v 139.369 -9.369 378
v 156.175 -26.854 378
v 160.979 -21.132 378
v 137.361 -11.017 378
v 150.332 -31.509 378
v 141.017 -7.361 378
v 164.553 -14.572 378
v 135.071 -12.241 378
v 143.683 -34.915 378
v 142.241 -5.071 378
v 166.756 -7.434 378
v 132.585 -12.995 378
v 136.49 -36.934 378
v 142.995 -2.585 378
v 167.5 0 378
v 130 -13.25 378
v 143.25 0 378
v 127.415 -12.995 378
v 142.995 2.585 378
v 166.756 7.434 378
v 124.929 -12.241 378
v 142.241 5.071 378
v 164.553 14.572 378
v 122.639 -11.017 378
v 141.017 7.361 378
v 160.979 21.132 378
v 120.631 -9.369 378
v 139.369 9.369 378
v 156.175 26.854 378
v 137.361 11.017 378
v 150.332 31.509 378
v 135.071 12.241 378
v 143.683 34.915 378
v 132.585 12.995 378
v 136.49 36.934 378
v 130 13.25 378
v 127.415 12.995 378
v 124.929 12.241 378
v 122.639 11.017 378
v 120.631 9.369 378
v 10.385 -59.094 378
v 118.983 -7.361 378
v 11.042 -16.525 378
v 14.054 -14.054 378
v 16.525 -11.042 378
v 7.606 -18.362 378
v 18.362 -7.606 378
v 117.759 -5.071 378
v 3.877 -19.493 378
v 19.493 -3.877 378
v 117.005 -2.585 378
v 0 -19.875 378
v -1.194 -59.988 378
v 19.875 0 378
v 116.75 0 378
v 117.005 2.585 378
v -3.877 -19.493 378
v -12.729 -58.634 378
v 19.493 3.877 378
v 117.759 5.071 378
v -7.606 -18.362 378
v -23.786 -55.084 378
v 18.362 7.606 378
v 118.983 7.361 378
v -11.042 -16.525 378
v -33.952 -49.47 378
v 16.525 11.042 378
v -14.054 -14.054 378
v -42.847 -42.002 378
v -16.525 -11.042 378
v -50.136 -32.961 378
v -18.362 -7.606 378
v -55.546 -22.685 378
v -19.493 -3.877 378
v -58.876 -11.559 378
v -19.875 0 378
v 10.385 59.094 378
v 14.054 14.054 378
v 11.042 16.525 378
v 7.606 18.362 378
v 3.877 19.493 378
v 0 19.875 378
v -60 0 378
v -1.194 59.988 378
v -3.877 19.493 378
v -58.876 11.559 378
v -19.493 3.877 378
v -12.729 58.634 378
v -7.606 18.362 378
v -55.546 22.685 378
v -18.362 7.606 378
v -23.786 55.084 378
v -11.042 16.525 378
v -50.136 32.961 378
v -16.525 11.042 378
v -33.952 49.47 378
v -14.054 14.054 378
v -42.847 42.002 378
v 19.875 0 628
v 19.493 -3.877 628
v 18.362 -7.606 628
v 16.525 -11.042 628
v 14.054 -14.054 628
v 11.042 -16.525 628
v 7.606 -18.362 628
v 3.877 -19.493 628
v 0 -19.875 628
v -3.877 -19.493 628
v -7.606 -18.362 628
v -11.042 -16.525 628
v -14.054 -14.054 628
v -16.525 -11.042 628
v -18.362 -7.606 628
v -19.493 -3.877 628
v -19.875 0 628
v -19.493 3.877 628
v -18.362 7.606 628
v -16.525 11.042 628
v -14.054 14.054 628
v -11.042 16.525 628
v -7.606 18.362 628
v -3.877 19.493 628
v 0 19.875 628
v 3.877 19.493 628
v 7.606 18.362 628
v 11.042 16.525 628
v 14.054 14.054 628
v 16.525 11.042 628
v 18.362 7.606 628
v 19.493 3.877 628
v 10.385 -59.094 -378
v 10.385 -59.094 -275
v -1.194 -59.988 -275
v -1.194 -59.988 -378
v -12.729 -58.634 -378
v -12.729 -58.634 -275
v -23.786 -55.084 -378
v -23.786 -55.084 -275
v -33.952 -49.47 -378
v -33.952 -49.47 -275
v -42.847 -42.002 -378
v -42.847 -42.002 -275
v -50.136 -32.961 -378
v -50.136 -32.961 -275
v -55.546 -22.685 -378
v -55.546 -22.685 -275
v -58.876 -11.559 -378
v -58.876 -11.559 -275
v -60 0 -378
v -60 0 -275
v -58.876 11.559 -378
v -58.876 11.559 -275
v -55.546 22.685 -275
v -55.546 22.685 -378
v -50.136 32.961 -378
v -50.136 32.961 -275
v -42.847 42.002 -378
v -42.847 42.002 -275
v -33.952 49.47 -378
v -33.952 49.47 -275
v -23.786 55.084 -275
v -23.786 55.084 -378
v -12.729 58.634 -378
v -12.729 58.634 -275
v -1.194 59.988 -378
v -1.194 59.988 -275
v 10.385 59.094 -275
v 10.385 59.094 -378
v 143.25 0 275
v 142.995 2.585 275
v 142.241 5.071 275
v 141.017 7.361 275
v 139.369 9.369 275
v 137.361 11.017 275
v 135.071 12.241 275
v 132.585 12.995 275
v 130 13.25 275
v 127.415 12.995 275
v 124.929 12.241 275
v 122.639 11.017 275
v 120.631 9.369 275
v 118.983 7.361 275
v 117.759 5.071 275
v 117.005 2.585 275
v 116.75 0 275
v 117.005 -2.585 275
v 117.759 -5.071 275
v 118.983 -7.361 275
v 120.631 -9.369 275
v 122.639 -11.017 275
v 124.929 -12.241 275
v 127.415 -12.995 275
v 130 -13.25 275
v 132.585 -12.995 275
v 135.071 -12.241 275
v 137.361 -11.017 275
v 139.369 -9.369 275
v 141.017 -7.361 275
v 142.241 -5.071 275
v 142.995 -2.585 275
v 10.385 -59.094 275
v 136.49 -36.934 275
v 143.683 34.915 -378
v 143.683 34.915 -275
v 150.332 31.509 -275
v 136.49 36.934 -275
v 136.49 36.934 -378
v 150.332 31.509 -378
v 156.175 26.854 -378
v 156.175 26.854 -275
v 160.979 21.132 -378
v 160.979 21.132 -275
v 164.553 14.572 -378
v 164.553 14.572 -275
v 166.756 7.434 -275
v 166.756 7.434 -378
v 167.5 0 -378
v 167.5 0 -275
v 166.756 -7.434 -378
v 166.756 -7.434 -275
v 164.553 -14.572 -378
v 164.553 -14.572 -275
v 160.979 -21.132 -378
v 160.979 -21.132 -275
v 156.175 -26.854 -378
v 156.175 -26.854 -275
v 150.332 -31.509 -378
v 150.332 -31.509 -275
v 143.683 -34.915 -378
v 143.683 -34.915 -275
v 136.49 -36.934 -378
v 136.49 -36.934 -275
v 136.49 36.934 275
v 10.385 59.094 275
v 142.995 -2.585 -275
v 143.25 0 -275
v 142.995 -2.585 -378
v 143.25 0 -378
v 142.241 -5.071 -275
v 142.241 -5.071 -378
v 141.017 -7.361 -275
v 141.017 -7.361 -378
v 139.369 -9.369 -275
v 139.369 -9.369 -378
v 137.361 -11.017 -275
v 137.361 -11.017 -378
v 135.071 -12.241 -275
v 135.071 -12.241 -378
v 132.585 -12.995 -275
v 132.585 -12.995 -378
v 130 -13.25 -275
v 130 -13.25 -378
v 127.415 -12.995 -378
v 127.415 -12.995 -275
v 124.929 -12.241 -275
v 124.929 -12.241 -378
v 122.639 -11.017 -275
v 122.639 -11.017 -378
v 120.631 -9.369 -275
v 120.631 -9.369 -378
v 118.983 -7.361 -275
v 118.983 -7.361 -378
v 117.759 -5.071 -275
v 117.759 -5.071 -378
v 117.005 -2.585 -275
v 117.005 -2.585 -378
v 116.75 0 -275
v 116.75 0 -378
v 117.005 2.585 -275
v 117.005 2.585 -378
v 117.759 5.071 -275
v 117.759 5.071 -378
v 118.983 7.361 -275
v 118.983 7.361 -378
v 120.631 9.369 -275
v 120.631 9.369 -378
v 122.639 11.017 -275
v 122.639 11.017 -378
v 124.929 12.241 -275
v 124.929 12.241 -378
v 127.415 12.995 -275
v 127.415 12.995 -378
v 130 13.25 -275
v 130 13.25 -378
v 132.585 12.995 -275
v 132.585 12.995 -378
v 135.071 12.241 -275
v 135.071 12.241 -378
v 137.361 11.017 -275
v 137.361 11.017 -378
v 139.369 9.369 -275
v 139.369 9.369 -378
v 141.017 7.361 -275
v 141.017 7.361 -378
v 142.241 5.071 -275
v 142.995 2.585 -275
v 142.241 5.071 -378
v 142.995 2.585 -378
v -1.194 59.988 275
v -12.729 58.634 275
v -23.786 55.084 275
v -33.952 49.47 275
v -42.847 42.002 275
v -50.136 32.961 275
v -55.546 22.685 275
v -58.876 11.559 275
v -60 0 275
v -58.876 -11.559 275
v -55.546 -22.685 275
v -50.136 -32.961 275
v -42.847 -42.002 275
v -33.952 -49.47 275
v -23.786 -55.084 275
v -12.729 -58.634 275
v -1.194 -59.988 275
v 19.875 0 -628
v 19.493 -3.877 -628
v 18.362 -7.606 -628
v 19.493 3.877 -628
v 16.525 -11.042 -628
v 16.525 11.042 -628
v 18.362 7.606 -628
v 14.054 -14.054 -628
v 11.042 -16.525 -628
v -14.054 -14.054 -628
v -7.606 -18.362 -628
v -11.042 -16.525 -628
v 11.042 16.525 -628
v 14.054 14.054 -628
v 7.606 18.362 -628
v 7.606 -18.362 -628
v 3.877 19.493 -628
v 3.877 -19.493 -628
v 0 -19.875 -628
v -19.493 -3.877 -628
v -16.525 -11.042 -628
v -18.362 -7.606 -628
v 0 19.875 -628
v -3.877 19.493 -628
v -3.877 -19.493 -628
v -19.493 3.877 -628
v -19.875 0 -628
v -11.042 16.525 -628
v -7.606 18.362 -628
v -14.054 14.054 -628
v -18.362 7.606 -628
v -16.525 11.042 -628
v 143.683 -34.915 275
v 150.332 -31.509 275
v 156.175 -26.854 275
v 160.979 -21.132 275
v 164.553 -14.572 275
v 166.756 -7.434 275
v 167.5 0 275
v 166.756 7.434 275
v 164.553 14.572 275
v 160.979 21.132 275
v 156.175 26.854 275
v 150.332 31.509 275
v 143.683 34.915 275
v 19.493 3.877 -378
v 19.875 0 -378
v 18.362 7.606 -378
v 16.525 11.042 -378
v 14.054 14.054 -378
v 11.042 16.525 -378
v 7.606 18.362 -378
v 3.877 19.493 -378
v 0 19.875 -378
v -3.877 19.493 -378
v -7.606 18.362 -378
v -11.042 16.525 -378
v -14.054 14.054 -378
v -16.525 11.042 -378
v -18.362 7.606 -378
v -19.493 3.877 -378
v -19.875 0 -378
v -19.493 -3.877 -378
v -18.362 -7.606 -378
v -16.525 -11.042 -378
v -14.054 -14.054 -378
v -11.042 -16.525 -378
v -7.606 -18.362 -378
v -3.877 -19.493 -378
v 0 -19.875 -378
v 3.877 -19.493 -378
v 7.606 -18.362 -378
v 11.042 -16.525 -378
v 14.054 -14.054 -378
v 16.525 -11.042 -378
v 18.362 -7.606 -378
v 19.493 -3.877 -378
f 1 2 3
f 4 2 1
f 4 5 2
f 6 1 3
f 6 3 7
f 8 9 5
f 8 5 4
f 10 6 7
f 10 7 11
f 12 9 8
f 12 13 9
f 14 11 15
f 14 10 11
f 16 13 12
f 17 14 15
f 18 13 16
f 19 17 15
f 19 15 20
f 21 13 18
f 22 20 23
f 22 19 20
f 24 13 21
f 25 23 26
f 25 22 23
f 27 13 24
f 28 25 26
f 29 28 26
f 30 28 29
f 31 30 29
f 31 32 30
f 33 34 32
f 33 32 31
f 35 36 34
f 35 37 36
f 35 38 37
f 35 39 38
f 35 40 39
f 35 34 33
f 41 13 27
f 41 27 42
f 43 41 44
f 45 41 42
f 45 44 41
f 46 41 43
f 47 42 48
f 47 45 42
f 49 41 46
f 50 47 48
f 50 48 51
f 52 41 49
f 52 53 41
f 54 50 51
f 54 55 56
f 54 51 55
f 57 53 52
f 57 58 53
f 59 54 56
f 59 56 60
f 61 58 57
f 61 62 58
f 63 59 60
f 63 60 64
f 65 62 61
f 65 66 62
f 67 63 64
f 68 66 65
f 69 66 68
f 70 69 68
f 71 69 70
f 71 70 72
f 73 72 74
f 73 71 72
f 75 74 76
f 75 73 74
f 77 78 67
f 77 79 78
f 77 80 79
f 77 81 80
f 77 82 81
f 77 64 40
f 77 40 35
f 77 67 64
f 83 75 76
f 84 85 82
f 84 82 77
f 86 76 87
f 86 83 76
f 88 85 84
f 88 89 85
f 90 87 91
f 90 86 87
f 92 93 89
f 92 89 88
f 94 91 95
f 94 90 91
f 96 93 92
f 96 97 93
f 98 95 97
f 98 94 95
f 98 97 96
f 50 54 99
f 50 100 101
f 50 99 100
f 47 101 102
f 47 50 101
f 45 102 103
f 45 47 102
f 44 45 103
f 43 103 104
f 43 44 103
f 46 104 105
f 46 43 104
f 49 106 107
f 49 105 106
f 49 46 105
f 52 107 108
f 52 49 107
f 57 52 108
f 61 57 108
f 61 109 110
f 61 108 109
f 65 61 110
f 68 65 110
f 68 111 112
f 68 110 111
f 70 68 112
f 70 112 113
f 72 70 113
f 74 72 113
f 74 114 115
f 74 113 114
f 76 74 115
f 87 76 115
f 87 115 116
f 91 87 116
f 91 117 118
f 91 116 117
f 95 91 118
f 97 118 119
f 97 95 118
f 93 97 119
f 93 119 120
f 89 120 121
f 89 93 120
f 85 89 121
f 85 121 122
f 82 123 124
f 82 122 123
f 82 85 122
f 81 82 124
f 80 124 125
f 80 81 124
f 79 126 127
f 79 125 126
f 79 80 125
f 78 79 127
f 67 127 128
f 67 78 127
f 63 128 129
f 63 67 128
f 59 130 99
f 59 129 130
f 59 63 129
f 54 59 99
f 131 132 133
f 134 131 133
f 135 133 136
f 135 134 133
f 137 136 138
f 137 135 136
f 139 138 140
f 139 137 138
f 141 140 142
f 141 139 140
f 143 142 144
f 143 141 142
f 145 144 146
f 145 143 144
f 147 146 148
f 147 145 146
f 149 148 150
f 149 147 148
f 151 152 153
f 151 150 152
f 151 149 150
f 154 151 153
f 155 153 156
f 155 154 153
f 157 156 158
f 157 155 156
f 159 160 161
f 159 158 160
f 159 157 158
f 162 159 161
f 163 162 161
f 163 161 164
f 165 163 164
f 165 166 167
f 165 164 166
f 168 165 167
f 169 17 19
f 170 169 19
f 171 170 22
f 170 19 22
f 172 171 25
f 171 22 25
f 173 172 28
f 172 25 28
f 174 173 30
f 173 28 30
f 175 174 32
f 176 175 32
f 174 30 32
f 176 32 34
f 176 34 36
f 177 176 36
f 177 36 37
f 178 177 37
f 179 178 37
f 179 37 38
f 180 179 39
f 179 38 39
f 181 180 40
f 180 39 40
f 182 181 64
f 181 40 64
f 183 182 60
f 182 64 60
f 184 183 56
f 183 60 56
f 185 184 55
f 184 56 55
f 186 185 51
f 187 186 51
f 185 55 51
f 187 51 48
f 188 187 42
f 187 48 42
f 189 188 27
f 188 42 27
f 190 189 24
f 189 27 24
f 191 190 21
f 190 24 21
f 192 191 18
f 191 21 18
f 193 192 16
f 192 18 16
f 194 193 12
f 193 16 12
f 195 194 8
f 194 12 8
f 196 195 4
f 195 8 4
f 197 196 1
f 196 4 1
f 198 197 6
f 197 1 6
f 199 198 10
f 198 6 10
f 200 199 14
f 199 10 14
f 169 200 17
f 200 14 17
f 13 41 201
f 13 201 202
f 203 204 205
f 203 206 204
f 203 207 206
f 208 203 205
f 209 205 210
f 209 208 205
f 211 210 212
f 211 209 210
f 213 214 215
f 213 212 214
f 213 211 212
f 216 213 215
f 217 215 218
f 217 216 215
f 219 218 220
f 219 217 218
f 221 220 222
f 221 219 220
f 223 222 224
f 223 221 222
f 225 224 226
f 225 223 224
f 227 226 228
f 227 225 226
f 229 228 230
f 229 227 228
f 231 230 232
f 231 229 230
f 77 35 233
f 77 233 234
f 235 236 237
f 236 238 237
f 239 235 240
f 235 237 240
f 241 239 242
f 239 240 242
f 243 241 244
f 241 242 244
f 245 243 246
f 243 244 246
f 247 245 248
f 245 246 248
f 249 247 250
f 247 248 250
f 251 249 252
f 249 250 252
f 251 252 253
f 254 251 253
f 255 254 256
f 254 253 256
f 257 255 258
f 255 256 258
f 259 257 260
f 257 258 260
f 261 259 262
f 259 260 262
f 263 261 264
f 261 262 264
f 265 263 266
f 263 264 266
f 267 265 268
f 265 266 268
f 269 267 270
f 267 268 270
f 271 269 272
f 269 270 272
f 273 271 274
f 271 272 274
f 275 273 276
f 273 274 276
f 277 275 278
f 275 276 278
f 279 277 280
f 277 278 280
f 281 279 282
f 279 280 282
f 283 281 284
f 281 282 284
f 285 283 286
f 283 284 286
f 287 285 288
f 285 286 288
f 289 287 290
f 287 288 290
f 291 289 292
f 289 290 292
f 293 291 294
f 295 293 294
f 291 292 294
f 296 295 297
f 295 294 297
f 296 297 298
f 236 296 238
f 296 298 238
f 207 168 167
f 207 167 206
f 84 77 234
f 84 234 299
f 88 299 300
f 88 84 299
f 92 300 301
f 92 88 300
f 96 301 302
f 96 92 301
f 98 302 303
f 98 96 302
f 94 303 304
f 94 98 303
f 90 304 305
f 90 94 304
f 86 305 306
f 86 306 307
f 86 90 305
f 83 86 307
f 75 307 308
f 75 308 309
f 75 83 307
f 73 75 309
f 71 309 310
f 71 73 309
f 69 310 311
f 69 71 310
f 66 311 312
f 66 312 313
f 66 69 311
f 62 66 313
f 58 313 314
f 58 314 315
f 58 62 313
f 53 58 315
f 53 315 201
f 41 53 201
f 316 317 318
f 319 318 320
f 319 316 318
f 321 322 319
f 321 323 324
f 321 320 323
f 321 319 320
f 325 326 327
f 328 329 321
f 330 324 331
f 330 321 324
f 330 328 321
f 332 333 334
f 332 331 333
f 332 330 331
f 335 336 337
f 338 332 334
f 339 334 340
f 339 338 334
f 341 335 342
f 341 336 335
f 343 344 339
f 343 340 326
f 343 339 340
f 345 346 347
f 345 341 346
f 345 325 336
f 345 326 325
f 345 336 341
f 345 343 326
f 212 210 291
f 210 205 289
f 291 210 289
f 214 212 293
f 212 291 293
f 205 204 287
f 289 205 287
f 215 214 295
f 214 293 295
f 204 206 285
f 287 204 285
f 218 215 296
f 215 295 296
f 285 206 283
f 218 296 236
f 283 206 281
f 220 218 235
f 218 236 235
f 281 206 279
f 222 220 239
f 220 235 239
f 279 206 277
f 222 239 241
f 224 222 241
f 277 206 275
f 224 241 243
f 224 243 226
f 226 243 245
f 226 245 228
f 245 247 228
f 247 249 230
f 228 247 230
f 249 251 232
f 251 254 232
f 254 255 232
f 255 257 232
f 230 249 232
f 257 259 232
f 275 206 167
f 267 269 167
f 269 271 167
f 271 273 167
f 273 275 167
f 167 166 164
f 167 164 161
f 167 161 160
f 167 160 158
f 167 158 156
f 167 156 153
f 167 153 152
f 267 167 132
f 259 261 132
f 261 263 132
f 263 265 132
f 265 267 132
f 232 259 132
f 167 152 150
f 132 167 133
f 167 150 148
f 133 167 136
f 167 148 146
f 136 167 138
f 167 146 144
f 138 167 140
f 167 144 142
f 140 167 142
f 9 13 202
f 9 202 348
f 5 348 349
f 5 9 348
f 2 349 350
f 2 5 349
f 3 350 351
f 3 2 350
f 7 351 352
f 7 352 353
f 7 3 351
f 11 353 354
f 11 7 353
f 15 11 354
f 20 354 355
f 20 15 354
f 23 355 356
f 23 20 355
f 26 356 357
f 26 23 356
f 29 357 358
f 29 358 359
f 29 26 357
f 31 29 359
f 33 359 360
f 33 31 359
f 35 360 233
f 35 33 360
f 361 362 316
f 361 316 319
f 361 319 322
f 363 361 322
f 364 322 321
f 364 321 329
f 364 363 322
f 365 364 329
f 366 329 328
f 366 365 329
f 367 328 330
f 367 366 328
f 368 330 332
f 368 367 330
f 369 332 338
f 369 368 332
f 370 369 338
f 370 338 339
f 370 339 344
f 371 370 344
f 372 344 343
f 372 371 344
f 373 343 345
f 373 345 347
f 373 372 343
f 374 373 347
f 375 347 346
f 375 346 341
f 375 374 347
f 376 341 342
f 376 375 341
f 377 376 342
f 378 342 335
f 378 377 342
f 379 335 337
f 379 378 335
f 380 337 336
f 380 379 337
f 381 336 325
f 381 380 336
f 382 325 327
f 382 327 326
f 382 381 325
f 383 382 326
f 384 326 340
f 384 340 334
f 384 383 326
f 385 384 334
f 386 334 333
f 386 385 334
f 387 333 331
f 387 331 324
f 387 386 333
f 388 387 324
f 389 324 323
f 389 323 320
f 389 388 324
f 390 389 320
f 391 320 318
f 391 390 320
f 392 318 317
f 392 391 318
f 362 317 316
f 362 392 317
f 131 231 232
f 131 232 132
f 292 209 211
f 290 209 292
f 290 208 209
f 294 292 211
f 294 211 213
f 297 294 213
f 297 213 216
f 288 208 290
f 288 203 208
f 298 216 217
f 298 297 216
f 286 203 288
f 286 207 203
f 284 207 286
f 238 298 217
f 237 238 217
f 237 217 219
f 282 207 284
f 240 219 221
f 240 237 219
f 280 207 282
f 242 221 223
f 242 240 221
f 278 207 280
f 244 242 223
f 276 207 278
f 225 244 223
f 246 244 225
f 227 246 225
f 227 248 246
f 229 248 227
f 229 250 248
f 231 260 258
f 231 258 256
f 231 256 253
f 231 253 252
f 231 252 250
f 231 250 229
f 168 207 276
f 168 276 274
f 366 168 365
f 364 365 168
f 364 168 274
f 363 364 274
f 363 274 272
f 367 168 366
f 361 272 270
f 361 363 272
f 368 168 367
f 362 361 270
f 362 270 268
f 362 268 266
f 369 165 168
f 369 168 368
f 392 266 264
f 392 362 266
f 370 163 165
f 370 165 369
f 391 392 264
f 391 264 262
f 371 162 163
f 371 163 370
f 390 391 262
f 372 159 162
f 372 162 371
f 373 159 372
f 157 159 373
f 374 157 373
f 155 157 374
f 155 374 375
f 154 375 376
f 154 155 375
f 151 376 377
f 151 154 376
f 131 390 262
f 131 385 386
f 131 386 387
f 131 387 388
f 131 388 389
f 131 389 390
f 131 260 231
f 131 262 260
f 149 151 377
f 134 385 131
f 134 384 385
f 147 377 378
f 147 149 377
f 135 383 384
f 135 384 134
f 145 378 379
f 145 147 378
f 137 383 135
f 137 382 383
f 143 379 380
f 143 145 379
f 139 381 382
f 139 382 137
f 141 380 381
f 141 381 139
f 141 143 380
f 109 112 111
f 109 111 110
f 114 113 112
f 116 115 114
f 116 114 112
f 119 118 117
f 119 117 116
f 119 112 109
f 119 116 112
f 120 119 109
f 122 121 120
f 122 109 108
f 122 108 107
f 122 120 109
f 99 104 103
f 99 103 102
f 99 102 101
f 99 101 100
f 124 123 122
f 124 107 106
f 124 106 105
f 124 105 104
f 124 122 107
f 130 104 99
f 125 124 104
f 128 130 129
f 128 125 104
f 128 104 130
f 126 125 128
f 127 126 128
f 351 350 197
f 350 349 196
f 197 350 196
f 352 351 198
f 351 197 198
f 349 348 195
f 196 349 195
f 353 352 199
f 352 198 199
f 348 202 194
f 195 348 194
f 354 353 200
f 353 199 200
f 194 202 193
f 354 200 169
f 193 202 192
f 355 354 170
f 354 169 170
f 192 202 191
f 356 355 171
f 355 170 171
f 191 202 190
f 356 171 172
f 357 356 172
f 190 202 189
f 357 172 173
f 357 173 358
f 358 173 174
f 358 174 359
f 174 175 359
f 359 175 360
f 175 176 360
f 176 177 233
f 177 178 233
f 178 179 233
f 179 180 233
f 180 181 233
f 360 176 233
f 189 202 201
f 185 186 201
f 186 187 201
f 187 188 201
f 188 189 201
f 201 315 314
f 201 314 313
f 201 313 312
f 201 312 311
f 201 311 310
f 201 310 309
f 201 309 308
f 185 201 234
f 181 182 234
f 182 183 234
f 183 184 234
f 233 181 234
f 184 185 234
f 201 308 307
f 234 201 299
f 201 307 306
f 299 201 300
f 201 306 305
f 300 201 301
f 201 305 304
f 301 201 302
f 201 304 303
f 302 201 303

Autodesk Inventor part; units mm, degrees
ref_plane "YZ Plane" through (0, 0, 0) normal (1, 0, 0) x (0, 1, 0)
ref_plane "XZ Plane" through (0, 0, 0) normal (0, 1, 0) x (-1, 0, 0)
ref_plane "工作平面2" through (0, 0, 378) normal (0, 0, 1) x (1, 0, 0)
sketch "草圖1" plane through (189, 0, 378) normal (0, 0, 1) x (0, 1, 0)
  line L0 (0, 189) -> (0, 59) construction
  line L1 (-59.0945, 178.6154) -> (-36.9341, 52.5096)
  line L2 (36.9341, 52.5096) -> (59.0945, 178.6154)
  arc A0 (59.0945, 178.6154) -> (-59.0945, 178.6154) centre (0, 189) ccw
  arc A1 (-36.9341, 52.5096) -> (36.9341, 52.5096) centre (0, 59) ccw
  point P0 (0, 124)
  dimension "d1" = 130
  dimension "d2" = 60
  dimension "d3" = 37.5
extrude "擠出1" add sketch "草圖1" against normal blind 103
sketch "草圖2" plane through (189, 0, 378) normal (0, 0, 1) x (1, 0, 0)
  circle A0 centre (-189, 0) radius 19.875
  dimension "d6" = 39.75
extrude "擠出2" add sketch "草圖2" along normal blind 250
sketch "草圖3" plane through (189, 0, 378) normal (0, 0, 1) x (1, 0, 0)
  arc A0 (-52.5096, -36.9341) -> (-52.5096, 36.9341) centre (-59, 0) ccw projected
  circle A1 centre (-59, 0) radius 13.25
  point P0 (-189, 0)
  dimension "d9" = 26.5
extrude "擠出3" cut sketch "草圖3" against normal through all
sketch "草圖4" plane through (136.4904, 36.9341, 275) normal (0.1730769, 0.9849083, 0) x (0, 0, 1)
  line L0 (103, 0) -> (0, 0) projected
  point P0 (-275, -128.0381)
  point P1 (51.5, 0)
hole "孔1" [suppressed]
sketch "草圖5" plane through (10.3846, -59.0945, 275) normal (0.1730769, -0.9849083, 0) x (0.9849083, 0.1730769, 0)
  line L0 (128.0381, 103) -> (128.0381, 0) projected
  point P0 (0, -275)
  point P1 (128.0381, 51.5)
hole "孔2" [suppressed]
mirror "鏡射2" about plane through (0, 0, 0) normal (0, 0, 1) of "擠出1", "擠出2", "擠出3"
equation "\"d1\" = R2"
equation "\"R2\" = T1A_R2"
equation "\"Width\" = T1A_R2_Width"
equation "\"d19\" = 0.5 * Width"
equation "\"T1A_R2_Width\" = 756"
equation "\"T1A_R1\" = 585.5331"
equation "\"T1A_R3\" = 252.3048"
equation "\"T1A_R4\" = 320.6953"
equation "\"T1A_R5\" = 419.3047"
equation "\"T1A_R7\" = -221.7475"
equation "\"T1A_R8\" = 369.2781"
equation "\"T1A_R1_Width\" = 756"
equation "\"T1A_R3_Width\" = 344"
equation "\"T1A_R4_Width\" = 756"
equation "\"T1A_Joint_Width\" = 756"
equation "\"T1A_R2\" = 130"
properties part number "Type 1A R2延伸曲柄:1" material "密度7850的鋼"
